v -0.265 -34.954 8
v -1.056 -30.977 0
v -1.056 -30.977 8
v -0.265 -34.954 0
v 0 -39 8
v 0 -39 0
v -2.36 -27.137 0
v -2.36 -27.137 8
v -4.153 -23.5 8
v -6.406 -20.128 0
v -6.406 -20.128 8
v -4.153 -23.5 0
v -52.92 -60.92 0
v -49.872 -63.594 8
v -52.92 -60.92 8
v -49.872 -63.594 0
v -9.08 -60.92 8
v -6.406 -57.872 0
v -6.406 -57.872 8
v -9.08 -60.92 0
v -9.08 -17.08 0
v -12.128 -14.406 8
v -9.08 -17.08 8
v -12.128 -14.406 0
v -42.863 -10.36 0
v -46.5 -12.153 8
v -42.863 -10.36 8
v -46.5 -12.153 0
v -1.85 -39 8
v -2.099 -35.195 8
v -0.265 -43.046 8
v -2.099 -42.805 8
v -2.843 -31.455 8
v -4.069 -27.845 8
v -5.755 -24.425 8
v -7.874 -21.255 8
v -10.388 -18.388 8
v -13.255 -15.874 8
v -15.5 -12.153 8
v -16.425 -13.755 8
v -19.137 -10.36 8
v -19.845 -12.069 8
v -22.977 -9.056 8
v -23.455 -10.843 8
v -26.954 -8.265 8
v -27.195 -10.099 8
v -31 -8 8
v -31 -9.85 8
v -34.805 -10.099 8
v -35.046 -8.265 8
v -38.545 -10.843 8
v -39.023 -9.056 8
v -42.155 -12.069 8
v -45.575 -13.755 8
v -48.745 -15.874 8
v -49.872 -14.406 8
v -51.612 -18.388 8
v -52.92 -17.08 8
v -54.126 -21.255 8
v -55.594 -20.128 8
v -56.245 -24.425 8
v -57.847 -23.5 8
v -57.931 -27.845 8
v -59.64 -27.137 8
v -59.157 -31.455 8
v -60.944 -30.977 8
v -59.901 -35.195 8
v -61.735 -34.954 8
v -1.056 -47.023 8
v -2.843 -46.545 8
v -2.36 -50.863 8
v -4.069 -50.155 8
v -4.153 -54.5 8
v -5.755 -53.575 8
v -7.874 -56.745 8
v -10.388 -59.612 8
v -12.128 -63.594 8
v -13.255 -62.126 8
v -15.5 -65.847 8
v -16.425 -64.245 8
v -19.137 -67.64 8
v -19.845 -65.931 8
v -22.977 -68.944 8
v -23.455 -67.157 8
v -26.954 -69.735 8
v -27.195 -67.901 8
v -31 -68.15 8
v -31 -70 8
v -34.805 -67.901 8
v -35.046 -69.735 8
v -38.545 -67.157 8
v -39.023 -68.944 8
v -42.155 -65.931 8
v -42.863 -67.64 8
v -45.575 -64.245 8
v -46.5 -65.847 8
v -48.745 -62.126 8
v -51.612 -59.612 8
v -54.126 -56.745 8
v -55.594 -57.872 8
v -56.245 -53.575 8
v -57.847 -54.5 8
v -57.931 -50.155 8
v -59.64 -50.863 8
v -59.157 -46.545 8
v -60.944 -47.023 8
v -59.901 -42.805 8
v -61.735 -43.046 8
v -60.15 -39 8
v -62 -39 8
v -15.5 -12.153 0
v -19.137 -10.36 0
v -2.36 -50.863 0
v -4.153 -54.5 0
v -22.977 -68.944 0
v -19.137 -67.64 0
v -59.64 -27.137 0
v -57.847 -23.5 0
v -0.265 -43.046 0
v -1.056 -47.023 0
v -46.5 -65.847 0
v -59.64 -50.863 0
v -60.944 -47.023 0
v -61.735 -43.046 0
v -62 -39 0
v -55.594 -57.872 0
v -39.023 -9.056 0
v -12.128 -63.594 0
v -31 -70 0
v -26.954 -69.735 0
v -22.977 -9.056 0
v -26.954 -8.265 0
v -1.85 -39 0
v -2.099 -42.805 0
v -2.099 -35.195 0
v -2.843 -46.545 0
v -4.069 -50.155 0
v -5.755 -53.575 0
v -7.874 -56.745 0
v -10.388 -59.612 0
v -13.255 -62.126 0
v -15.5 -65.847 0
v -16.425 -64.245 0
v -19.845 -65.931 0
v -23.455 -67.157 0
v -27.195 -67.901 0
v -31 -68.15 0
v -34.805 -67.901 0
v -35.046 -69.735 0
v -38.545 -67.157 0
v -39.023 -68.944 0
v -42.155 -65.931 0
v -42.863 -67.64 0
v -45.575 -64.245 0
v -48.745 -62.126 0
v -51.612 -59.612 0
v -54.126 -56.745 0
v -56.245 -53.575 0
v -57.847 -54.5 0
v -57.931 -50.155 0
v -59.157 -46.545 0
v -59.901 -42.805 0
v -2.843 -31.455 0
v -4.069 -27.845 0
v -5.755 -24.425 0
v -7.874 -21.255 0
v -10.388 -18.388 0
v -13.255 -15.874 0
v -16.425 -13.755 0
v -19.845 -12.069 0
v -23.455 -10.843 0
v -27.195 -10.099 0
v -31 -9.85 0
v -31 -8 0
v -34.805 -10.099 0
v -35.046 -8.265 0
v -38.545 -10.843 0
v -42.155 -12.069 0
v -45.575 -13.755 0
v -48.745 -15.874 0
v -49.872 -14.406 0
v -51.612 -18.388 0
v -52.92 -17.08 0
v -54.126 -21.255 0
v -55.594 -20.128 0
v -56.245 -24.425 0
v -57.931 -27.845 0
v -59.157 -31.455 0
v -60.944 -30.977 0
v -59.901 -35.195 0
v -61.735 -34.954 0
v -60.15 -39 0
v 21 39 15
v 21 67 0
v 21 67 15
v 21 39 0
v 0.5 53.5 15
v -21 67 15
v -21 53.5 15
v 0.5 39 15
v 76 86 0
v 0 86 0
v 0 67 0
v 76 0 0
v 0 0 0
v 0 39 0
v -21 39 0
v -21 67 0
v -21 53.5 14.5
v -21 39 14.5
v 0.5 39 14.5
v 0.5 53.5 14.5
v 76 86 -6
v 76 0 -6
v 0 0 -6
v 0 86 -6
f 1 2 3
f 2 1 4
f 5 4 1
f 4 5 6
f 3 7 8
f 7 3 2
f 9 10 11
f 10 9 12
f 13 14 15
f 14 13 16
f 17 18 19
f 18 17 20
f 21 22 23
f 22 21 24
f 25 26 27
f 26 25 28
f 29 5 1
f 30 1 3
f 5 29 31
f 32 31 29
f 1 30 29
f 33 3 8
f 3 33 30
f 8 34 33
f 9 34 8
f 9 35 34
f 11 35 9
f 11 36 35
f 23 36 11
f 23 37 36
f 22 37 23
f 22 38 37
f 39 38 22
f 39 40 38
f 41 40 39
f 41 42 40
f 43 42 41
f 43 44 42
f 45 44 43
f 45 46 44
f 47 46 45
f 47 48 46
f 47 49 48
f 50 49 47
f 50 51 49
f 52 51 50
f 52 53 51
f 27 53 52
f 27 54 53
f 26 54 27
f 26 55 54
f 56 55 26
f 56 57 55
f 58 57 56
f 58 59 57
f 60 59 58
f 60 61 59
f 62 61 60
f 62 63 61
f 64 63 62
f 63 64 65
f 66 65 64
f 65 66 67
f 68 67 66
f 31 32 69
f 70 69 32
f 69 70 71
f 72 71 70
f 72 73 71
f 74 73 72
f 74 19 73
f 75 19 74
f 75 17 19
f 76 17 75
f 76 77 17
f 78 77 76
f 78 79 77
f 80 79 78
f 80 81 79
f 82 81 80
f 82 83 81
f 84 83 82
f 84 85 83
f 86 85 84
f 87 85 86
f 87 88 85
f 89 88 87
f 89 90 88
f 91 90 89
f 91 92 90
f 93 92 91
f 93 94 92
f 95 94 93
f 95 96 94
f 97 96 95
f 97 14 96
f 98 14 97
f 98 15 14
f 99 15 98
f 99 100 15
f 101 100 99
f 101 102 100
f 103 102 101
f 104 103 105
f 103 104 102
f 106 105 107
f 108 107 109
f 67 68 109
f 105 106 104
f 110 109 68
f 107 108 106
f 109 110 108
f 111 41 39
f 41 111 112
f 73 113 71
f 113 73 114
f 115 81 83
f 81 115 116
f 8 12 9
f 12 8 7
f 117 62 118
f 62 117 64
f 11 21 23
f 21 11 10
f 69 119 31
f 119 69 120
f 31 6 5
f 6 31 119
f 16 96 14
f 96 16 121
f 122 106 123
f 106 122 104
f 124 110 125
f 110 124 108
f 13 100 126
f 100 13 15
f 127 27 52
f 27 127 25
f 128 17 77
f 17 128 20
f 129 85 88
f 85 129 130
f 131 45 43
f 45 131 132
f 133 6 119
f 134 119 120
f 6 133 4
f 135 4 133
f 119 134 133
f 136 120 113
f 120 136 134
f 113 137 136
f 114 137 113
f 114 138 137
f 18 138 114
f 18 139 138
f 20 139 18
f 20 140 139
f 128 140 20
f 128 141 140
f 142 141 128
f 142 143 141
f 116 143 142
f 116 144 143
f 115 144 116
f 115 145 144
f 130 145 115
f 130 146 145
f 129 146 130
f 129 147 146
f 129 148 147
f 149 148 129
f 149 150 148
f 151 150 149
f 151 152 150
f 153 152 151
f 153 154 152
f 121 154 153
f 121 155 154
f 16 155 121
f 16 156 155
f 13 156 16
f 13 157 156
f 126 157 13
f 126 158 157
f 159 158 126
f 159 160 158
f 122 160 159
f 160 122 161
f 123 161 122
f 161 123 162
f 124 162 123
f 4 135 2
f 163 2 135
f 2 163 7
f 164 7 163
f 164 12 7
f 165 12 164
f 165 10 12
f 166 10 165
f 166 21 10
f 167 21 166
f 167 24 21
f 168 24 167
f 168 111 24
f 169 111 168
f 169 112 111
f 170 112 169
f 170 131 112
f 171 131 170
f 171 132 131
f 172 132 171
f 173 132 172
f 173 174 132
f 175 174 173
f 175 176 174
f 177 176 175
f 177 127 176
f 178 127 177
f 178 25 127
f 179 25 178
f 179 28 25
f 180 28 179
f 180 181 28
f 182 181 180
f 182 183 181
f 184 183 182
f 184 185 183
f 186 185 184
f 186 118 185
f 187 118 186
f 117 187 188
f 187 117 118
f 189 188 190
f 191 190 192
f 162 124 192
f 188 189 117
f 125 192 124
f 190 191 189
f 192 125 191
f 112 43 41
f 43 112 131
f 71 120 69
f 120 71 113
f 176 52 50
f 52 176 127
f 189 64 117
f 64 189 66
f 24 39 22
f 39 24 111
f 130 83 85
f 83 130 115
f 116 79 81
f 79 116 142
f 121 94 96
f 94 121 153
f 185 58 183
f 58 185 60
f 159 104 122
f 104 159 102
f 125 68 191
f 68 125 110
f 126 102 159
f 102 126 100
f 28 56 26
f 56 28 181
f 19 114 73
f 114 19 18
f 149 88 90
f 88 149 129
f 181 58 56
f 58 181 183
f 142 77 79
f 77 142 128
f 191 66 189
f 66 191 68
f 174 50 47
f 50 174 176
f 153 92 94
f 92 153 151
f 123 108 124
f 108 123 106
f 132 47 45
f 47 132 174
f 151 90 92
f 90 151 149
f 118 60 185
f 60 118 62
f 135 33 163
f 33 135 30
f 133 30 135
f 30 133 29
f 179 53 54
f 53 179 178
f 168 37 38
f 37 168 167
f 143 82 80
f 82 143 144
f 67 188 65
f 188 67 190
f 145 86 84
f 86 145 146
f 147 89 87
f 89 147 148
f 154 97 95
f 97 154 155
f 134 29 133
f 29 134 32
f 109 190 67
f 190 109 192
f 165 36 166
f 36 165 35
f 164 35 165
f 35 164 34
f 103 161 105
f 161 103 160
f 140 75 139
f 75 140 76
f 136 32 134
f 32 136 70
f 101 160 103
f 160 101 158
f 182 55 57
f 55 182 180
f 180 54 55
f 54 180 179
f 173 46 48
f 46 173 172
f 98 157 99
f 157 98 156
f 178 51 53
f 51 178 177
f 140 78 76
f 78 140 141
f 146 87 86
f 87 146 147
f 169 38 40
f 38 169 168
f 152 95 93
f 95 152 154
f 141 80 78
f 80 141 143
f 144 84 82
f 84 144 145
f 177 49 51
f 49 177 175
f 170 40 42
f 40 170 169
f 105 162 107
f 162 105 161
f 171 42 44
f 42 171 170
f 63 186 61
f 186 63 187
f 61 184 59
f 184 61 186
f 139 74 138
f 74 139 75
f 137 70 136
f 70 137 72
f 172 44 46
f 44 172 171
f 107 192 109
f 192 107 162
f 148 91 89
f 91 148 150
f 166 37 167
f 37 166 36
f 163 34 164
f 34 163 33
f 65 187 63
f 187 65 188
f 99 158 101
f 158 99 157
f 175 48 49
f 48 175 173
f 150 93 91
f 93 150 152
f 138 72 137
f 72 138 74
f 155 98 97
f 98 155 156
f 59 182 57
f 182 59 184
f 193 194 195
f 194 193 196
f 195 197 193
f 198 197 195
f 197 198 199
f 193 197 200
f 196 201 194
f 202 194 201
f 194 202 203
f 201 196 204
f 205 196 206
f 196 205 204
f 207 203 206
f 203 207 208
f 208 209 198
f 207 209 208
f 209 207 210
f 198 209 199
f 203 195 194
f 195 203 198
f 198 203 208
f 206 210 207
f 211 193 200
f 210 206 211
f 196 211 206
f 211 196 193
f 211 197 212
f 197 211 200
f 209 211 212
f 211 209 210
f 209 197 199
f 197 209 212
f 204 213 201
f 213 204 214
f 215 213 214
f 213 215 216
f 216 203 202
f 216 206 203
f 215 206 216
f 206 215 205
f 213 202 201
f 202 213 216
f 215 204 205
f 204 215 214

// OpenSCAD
// Dock Auto-Empty Fan PORT GAUGE (Jig 19B)
// ===========================================================================
// Port/seal mating check for the BOM "Auto-empty suction fan" (Dock table)
// class draft. Two features on one plate:
//   A — inlet boss ring: an open ring sized to slip over the fan's inlet boss
//       (light-interference seal-collar fit);
//   B — outlet plug: a rectangular plug sized to the outlet duct's inner
//       opening (what the dock duct/gasket must mate against).
//
// Keep these values in sync with dock-auto-empty-fan.scad (provenance lives
// there + MEASURE-ME.md §20). Tune the clearances, never the part.
//
// Pass/fail + fail->fix mapping: PRINT-TEST.md Jig 19 Part B.
// License: CC BY-SA 4.0

$fn = 48;

/* [Fan params — mirror dock-auto-empty-fan.scad] */
inlet_od       = 58; // mm (estimate) inlet boss outer diameter
outlet_w       = 42; // mm (estimate) outlet duct inner width (axial dir)
outlet_h       = 28; // mm (estimate) outlet duct inner height (radial dir)

/* [Jig dimensions - EDIT] */
// Ring inner diameter = inlet_od + ring_clearance (positive = slip fit).
// Start 0.3; tighter for seal-collar intent after first test.
ring_clearance = 0.3; // mm (estimate) DIAMETRAL
ring_t         = 2.0; // mm ring wall thickness (radial)
ring_h         = 8.0; // mm ring height (axial)

// Plug outer = outlet inner - plug_clearance (positive = fits in opening).
// Start 0.3.
plug_clearance = 0.3; // mm (estimate)
plug_len       = 15;  // mm plug protrusion past the plate face

/* [Plate] */
plate_t        = 6.0; // mm base thickness
plate_margin   = 8;   // mm margin around features

// ===== GEOMETRY (origin = plate center xy, plate top at z = 0) =====
plate_l = plate_margin + ring_h + ring_t + (outlet_w + 2 * plate_margin);
plate_w = plate_margin + (inlet_od + 2 * ring_t + 2 * plate_margin);

module ring_gauge() {
    // Ring sits ON the plate (top face = 0), centered in X at plate center,
    // offset toward -Y on the plate
    translate([-inlet_od / 2 - ring_t, -(inlet_od / 2 + ring_t + plate_margin), 0]) {
        difference() {
            cylinder(h = ring_h, r = inlet_od / 2 + ring_t);
            translate([0, 0, -0.1])
                cylinder(h = ring_h + 0.2, r = inlet_od / 2 + ring_clearance / 2);
        }
    }
}

module plug_gauge() {
    // Rectangular plug sticking up from the plate, centered toward +Y
    translate([-outlet_w / 2, inlet_od / 2 + ring_t + plate_margin, 0]) {
        difference() {
            cube([outlet_w, outlet_h, plug_len]);
            // chamfer the free end so it self-aligns into the outlet
            translate([0, 0, plug_len])
                rotate([0, 0, 0])
                    cube([outlet_w + 1, outlet_h + 1, 1], center = true);
        }
    }
}

module port_gauge() {
    translate([0, 0, -plate_t]) {
        cube([plate_l, plate_w, plate_t]);
    }
    ring_gauge();
    plug_gauge();
}

port_gauge();
